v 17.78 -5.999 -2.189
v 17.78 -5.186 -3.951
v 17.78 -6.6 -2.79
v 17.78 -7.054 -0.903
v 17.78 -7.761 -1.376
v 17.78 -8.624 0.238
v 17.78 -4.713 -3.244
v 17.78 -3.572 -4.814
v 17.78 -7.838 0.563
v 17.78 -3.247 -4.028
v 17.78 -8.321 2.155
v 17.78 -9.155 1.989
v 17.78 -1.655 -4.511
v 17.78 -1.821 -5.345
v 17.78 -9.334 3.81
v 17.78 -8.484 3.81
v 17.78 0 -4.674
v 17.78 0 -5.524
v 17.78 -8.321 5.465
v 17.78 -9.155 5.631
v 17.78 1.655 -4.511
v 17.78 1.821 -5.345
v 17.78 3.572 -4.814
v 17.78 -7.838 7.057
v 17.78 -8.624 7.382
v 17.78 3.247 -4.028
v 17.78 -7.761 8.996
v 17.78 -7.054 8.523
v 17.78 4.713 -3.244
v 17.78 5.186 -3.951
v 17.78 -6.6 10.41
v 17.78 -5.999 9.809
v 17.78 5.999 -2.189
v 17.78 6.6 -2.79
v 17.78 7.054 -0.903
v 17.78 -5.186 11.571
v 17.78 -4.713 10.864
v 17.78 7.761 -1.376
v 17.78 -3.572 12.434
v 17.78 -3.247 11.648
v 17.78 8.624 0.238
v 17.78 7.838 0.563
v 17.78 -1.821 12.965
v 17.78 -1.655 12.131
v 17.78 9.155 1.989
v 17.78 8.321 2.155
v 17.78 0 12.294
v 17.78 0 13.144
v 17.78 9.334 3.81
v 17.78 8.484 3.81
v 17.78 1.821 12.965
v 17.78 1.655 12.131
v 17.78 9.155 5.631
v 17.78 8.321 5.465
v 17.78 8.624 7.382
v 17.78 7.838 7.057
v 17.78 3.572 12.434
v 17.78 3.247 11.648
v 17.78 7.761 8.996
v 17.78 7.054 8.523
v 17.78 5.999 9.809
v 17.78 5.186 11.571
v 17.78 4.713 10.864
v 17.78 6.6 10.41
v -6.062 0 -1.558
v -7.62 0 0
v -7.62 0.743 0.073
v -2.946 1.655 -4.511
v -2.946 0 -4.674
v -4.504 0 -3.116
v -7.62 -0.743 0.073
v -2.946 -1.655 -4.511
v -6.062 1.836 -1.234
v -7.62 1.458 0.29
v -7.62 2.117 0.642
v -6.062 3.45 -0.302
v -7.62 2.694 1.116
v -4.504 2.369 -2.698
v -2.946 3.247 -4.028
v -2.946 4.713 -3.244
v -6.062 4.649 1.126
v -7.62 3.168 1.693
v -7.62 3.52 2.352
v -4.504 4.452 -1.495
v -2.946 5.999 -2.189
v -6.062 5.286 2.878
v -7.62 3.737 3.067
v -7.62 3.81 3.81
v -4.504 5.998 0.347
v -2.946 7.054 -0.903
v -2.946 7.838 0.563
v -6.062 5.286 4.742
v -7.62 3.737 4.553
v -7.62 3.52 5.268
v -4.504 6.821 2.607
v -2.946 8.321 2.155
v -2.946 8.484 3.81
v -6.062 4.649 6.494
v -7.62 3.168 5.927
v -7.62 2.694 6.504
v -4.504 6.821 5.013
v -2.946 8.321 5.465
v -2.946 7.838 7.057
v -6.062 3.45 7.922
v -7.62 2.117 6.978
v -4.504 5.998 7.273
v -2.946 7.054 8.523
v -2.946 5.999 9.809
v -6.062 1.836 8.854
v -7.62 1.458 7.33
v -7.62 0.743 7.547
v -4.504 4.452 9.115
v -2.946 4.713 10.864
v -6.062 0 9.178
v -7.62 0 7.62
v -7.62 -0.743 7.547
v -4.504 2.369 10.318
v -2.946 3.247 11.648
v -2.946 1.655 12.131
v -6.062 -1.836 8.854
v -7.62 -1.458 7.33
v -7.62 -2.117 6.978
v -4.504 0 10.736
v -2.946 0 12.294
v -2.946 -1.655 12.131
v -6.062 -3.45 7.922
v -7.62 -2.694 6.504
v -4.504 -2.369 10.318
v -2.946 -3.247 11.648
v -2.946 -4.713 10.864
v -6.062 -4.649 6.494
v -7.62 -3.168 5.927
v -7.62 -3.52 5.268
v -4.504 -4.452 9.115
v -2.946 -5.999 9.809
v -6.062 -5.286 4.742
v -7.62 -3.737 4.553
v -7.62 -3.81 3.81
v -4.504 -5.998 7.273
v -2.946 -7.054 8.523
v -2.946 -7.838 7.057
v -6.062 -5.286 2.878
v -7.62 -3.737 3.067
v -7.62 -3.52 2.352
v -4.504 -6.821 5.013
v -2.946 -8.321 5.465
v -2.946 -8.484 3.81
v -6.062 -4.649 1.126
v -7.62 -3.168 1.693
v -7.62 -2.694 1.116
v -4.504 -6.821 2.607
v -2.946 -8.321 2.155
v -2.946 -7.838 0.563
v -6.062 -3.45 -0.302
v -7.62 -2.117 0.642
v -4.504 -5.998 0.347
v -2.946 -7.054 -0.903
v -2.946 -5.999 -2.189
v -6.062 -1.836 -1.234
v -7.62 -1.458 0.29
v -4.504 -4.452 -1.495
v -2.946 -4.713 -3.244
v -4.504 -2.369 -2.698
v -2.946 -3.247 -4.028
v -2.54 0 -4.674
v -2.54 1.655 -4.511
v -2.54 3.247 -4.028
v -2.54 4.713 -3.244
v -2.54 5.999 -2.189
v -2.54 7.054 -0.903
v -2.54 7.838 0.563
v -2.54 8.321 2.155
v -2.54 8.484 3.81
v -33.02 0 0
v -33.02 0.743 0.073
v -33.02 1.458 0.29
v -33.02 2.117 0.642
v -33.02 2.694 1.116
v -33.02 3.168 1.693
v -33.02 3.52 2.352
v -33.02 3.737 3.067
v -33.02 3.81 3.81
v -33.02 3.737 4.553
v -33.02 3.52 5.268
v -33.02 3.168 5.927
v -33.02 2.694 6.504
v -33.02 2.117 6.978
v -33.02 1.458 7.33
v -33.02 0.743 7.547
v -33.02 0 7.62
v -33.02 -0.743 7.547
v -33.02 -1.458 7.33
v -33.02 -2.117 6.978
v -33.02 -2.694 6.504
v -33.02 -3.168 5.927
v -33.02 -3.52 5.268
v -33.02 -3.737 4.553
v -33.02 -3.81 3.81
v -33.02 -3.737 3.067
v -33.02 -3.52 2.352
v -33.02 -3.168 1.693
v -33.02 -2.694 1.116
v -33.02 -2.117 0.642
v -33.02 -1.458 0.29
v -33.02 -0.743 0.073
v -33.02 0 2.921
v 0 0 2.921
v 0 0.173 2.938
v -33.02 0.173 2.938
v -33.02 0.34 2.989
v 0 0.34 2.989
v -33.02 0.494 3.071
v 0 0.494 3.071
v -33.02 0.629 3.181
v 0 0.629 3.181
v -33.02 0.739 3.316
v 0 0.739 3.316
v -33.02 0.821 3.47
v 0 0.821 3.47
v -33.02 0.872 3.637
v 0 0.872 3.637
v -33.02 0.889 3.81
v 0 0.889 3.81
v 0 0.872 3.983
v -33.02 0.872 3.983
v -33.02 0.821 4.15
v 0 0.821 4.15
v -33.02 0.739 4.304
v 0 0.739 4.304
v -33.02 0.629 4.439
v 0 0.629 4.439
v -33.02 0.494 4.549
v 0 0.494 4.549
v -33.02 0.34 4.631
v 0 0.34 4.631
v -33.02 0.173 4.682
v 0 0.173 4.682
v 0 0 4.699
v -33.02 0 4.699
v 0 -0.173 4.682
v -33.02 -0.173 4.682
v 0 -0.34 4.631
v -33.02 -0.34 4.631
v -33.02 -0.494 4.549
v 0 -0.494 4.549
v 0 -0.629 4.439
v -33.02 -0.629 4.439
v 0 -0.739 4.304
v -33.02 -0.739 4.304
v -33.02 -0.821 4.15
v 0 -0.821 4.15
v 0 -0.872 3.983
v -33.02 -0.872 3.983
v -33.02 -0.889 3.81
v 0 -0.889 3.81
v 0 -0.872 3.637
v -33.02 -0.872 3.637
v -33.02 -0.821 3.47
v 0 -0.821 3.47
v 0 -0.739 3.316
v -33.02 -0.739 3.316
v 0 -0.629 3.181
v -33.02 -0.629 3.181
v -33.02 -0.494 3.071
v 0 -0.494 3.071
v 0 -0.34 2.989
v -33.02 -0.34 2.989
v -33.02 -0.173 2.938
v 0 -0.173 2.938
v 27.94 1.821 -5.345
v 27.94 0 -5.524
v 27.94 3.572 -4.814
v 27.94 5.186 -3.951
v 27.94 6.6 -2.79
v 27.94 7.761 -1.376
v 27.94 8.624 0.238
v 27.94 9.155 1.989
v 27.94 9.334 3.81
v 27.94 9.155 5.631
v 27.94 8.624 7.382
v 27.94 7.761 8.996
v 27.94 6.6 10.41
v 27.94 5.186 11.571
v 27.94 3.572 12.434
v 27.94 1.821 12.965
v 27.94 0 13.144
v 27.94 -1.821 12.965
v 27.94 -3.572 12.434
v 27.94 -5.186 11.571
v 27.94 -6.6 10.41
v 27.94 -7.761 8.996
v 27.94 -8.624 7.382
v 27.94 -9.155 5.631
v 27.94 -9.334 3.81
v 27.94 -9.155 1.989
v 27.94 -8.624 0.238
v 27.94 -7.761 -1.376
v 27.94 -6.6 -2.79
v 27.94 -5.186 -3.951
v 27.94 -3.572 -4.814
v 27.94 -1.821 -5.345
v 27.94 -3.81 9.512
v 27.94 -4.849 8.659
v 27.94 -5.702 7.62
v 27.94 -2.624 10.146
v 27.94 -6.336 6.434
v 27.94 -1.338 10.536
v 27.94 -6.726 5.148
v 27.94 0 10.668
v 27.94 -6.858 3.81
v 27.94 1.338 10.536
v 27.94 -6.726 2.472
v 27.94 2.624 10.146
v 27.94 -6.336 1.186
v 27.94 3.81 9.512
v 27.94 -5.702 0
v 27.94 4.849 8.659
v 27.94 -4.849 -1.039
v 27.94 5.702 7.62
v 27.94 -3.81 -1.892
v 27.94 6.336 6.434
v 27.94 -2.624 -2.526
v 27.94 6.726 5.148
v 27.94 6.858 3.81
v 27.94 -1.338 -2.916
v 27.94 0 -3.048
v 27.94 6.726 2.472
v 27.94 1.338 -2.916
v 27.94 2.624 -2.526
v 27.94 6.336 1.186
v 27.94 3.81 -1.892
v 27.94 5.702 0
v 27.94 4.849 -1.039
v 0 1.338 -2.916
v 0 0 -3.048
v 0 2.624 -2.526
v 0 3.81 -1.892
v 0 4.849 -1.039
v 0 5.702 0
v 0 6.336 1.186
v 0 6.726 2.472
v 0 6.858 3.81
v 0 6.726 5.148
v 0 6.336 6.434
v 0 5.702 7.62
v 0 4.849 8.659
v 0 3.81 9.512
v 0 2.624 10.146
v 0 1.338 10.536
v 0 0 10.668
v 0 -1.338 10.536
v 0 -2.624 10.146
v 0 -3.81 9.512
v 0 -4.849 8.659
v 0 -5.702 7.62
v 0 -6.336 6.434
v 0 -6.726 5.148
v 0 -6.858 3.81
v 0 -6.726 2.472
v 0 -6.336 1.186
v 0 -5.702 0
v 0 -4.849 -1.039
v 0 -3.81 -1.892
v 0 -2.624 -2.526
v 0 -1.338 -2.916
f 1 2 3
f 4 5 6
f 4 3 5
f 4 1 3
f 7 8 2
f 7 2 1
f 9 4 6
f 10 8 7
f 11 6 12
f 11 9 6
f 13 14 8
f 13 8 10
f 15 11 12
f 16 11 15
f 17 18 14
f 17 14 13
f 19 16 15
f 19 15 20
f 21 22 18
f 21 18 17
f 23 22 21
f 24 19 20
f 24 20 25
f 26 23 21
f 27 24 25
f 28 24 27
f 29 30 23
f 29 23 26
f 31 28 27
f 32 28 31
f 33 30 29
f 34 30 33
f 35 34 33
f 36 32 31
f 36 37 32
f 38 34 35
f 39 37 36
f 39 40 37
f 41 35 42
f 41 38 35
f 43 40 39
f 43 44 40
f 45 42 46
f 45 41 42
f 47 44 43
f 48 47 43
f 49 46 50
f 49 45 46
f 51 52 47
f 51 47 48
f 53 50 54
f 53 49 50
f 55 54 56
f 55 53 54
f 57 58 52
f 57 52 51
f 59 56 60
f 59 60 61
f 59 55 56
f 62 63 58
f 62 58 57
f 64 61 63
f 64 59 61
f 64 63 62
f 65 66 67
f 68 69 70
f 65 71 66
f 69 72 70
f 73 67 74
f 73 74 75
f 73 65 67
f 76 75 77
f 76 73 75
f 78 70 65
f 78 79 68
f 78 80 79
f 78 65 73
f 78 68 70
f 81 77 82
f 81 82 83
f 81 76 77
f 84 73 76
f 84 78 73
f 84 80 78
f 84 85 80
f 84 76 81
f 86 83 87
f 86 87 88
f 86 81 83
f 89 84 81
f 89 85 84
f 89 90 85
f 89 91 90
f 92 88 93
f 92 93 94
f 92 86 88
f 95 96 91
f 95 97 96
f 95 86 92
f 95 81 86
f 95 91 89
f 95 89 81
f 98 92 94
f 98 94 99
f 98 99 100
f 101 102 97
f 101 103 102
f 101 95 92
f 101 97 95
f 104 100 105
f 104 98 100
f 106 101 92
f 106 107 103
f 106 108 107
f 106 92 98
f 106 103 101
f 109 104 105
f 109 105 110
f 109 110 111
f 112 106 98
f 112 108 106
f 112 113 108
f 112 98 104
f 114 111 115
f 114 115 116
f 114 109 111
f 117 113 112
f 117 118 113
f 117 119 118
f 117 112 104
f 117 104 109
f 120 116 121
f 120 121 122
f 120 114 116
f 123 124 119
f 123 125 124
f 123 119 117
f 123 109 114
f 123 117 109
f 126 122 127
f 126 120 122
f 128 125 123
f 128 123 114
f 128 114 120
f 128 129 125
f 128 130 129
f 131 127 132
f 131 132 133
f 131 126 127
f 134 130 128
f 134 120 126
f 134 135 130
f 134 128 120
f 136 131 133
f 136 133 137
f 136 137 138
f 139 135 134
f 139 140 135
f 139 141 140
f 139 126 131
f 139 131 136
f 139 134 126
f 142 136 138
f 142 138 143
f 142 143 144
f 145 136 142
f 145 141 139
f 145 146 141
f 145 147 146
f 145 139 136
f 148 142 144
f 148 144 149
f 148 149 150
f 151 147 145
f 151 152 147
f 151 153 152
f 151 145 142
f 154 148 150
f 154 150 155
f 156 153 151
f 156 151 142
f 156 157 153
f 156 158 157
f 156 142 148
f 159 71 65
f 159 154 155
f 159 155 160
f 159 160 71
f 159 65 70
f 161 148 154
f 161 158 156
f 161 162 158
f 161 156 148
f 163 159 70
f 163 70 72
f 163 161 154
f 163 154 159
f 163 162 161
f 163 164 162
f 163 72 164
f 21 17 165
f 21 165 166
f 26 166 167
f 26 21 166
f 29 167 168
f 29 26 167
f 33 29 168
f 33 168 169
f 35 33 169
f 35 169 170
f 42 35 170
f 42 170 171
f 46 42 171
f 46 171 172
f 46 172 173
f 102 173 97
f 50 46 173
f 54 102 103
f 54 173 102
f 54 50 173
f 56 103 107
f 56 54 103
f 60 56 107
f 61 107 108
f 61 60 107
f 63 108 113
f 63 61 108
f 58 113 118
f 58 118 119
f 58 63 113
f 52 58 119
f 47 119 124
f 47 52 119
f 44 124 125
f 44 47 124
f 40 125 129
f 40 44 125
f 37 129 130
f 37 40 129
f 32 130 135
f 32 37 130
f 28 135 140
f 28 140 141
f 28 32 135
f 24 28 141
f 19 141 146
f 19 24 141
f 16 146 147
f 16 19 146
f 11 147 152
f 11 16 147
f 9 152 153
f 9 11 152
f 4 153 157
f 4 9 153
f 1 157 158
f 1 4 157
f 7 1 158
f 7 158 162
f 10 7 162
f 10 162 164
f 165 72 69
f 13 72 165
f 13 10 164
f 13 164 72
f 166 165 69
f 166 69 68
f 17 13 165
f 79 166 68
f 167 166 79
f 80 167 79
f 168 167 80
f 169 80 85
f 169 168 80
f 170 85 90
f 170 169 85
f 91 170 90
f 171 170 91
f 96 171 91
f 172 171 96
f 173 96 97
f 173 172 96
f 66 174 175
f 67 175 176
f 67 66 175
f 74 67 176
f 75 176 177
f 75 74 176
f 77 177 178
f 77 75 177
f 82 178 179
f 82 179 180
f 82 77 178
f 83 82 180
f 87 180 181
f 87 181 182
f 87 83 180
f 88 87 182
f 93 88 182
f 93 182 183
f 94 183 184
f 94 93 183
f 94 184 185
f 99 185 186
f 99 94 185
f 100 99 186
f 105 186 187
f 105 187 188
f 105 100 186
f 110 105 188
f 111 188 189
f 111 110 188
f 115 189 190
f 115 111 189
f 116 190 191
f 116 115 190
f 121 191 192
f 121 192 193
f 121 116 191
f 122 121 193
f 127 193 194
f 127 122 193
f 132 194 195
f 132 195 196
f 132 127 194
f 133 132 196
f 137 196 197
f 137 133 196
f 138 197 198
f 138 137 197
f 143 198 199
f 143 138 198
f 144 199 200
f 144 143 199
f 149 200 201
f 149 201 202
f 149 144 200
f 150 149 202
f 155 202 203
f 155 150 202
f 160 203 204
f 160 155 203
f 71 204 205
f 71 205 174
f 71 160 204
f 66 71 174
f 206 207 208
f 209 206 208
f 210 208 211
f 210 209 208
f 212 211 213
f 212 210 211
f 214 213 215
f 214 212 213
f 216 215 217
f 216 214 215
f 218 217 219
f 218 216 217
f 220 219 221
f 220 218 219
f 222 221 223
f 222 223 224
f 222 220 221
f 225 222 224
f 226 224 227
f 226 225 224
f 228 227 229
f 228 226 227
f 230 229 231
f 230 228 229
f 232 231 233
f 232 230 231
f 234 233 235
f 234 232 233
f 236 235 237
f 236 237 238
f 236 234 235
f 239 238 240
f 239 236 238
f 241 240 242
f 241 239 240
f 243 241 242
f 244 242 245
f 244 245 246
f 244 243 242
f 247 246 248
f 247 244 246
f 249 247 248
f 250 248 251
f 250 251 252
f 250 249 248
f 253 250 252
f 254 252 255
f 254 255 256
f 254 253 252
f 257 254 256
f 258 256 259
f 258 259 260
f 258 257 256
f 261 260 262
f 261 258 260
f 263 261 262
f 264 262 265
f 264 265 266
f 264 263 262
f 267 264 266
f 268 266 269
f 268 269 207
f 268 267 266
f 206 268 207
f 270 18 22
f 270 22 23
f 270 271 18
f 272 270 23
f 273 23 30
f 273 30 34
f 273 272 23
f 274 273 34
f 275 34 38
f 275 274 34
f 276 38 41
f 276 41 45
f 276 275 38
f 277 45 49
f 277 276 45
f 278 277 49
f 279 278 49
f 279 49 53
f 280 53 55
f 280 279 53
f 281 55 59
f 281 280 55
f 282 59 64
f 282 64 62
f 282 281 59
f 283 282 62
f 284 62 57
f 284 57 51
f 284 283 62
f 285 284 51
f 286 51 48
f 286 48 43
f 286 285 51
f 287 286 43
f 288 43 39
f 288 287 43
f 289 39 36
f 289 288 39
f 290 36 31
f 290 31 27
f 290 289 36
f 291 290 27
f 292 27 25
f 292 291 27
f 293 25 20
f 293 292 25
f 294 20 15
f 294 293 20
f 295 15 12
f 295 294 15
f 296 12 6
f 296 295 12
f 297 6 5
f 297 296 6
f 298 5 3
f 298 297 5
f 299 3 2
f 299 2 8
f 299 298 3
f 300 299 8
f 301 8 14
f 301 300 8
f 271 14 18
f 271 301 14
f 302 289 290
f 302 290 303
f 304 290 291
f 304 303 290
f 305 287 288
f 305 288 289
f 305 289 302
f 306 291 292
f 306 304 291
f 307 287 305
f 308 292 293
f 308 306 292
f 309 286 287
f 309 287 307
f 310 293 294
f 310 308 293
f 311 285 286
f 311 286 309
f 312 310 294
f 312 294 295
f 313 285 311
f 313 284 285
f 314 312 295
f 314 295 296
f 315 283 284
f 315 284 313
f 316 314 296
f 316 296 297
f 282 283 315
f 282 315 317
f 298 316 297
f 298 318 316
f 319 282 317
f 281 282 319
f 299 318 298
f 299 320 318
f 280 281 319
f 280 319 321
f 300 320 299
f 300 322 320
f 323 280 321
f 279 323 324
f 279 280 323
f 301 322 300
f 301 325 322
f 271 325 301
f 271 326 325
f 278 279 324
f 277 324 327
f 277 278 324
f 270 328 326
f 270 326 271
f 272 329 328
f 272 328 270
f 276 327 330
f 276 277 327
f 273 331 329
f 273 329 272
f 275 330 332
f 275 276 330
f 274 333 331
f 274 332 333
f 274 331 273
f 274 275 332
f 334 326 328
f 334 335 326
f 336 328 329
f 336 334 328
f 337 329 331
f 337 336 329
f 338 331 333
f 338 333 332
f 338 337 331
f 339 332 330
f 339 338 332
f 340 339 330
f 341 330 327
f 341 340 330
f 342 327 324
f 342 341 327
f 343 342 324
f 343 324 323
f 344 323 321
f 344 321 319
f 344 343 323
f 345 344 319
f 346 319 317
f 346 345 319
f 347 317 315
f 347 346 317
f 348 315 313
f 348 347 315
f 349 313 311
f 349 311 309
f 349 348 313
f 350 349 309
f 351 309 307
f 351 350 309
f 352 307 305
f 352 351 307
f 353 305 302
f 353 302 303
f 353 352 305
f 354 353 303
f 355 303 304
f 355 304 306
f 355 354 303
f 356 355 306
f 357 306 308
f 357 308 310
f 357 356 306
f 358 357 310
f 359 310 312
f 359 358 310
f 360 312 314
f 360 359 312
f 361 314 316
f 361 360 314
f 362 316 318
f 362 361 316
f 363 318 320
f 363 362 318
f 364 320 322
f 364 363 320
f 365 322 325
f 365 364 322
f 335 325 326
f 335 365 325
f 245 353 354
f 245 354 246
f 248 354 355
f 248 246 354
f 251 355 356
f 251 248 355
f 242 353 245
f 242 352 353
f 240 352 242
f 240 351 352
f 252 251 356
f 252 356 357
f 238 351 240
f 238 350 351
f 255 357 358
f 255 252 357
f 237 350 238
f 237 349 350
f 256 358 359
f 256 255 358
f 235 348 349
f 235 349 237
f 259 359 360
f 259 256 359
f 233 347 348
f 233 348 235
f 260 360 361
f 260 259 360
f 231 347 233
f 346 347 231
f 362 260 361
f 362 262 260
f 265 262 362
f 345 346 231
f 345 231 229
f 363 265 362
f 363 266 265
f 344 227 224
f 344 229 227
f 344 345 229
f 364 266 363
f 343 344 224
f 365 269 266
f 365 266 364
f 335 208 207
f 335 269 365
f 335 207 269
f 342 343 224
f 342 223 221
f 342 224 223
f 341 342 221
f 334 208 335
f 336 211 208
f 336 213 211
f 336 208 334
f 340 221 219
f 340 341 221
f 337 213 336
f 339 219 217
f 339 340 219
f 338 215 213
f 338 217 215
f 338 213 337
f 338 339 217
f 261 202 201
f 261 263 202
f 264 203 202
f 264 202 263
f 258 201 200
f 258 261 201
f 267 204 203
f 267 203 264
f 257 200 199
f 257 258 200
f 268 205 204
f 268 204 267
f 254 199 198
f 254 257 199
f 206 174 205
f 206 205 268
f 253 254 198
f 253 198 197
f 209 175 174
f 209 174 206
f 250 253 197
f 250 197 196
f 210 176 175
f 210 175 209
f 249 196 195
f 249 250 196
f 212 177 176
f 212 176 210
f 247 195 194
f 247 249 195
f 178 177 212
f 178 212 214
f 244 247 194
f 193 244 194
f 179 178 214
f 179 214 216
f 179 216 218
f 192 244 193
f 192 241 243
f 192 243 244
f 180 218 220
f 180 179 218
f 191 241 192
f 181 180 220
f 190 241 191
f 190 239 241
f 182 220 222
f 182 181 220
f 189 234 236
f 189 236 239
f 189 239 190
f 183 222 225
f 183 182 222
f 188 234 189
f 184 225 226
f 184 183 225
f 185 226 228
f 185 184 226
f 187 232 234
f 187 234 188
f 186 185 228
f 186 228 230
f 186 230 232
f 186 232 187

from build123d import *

# Parameters (mm, degrees)
F2_S5_R     = 8.4836
F2_T6_DEPTH = 14


# Not quite as in the source:
# - a fillet or chamfer that OpenCascade refuses, or shapes differently, is made with other operations: its cross-section is extruded or revolved along the edge and cut away or added


with BuildPart() as f1:
    # F0 (on Front) → F1 (revolve)
    with BuildSketch(Plane.XZ):
        Polygon((-33.02, 0), (-2.54, 0), (-2.54, -4.6736), (17.78, -4.6736), (17.78, -5.5245), (27.94, -5.5245), (27.94, -3.048), (0, -3.048), (0, 2.921), (-33.02, 2.921), align=None)
    revolve(axis=Axis((-5.3856544969, 0, 3.81), (1, 0, 0)))

    # F2: chamfer of 5.08 on 1 edges, made by hand


with BuildPart() as f2_tool2:
    # F2_s3 → F2_t4 (revolve)
    with BuildSketch(Plane.XZ):
        Polygon((-7.62, 0), (-2.54, -5.08), (-2.54, 0), align=None)
    revolve(axis=Axis((-2.54, 0, 3.81), (1, 0, 0)))

    # F2_s5 → F2_t6 (intersect, symmetric)
    with BuildSketch(Plane.YZ.offset(-5.1)):
        with Locations((0, 3.81)):
            Circle(F2_S5_R)
    extrude(amount=F2_T6_DEPTH, both=True, mode=Mode.INTERSECT)


with BuildPart() as f1_1:
    add(f1.part)

    # F2_t1: union F2_tool2
    add(f2_tool2.part)


solid = f1_1.part
